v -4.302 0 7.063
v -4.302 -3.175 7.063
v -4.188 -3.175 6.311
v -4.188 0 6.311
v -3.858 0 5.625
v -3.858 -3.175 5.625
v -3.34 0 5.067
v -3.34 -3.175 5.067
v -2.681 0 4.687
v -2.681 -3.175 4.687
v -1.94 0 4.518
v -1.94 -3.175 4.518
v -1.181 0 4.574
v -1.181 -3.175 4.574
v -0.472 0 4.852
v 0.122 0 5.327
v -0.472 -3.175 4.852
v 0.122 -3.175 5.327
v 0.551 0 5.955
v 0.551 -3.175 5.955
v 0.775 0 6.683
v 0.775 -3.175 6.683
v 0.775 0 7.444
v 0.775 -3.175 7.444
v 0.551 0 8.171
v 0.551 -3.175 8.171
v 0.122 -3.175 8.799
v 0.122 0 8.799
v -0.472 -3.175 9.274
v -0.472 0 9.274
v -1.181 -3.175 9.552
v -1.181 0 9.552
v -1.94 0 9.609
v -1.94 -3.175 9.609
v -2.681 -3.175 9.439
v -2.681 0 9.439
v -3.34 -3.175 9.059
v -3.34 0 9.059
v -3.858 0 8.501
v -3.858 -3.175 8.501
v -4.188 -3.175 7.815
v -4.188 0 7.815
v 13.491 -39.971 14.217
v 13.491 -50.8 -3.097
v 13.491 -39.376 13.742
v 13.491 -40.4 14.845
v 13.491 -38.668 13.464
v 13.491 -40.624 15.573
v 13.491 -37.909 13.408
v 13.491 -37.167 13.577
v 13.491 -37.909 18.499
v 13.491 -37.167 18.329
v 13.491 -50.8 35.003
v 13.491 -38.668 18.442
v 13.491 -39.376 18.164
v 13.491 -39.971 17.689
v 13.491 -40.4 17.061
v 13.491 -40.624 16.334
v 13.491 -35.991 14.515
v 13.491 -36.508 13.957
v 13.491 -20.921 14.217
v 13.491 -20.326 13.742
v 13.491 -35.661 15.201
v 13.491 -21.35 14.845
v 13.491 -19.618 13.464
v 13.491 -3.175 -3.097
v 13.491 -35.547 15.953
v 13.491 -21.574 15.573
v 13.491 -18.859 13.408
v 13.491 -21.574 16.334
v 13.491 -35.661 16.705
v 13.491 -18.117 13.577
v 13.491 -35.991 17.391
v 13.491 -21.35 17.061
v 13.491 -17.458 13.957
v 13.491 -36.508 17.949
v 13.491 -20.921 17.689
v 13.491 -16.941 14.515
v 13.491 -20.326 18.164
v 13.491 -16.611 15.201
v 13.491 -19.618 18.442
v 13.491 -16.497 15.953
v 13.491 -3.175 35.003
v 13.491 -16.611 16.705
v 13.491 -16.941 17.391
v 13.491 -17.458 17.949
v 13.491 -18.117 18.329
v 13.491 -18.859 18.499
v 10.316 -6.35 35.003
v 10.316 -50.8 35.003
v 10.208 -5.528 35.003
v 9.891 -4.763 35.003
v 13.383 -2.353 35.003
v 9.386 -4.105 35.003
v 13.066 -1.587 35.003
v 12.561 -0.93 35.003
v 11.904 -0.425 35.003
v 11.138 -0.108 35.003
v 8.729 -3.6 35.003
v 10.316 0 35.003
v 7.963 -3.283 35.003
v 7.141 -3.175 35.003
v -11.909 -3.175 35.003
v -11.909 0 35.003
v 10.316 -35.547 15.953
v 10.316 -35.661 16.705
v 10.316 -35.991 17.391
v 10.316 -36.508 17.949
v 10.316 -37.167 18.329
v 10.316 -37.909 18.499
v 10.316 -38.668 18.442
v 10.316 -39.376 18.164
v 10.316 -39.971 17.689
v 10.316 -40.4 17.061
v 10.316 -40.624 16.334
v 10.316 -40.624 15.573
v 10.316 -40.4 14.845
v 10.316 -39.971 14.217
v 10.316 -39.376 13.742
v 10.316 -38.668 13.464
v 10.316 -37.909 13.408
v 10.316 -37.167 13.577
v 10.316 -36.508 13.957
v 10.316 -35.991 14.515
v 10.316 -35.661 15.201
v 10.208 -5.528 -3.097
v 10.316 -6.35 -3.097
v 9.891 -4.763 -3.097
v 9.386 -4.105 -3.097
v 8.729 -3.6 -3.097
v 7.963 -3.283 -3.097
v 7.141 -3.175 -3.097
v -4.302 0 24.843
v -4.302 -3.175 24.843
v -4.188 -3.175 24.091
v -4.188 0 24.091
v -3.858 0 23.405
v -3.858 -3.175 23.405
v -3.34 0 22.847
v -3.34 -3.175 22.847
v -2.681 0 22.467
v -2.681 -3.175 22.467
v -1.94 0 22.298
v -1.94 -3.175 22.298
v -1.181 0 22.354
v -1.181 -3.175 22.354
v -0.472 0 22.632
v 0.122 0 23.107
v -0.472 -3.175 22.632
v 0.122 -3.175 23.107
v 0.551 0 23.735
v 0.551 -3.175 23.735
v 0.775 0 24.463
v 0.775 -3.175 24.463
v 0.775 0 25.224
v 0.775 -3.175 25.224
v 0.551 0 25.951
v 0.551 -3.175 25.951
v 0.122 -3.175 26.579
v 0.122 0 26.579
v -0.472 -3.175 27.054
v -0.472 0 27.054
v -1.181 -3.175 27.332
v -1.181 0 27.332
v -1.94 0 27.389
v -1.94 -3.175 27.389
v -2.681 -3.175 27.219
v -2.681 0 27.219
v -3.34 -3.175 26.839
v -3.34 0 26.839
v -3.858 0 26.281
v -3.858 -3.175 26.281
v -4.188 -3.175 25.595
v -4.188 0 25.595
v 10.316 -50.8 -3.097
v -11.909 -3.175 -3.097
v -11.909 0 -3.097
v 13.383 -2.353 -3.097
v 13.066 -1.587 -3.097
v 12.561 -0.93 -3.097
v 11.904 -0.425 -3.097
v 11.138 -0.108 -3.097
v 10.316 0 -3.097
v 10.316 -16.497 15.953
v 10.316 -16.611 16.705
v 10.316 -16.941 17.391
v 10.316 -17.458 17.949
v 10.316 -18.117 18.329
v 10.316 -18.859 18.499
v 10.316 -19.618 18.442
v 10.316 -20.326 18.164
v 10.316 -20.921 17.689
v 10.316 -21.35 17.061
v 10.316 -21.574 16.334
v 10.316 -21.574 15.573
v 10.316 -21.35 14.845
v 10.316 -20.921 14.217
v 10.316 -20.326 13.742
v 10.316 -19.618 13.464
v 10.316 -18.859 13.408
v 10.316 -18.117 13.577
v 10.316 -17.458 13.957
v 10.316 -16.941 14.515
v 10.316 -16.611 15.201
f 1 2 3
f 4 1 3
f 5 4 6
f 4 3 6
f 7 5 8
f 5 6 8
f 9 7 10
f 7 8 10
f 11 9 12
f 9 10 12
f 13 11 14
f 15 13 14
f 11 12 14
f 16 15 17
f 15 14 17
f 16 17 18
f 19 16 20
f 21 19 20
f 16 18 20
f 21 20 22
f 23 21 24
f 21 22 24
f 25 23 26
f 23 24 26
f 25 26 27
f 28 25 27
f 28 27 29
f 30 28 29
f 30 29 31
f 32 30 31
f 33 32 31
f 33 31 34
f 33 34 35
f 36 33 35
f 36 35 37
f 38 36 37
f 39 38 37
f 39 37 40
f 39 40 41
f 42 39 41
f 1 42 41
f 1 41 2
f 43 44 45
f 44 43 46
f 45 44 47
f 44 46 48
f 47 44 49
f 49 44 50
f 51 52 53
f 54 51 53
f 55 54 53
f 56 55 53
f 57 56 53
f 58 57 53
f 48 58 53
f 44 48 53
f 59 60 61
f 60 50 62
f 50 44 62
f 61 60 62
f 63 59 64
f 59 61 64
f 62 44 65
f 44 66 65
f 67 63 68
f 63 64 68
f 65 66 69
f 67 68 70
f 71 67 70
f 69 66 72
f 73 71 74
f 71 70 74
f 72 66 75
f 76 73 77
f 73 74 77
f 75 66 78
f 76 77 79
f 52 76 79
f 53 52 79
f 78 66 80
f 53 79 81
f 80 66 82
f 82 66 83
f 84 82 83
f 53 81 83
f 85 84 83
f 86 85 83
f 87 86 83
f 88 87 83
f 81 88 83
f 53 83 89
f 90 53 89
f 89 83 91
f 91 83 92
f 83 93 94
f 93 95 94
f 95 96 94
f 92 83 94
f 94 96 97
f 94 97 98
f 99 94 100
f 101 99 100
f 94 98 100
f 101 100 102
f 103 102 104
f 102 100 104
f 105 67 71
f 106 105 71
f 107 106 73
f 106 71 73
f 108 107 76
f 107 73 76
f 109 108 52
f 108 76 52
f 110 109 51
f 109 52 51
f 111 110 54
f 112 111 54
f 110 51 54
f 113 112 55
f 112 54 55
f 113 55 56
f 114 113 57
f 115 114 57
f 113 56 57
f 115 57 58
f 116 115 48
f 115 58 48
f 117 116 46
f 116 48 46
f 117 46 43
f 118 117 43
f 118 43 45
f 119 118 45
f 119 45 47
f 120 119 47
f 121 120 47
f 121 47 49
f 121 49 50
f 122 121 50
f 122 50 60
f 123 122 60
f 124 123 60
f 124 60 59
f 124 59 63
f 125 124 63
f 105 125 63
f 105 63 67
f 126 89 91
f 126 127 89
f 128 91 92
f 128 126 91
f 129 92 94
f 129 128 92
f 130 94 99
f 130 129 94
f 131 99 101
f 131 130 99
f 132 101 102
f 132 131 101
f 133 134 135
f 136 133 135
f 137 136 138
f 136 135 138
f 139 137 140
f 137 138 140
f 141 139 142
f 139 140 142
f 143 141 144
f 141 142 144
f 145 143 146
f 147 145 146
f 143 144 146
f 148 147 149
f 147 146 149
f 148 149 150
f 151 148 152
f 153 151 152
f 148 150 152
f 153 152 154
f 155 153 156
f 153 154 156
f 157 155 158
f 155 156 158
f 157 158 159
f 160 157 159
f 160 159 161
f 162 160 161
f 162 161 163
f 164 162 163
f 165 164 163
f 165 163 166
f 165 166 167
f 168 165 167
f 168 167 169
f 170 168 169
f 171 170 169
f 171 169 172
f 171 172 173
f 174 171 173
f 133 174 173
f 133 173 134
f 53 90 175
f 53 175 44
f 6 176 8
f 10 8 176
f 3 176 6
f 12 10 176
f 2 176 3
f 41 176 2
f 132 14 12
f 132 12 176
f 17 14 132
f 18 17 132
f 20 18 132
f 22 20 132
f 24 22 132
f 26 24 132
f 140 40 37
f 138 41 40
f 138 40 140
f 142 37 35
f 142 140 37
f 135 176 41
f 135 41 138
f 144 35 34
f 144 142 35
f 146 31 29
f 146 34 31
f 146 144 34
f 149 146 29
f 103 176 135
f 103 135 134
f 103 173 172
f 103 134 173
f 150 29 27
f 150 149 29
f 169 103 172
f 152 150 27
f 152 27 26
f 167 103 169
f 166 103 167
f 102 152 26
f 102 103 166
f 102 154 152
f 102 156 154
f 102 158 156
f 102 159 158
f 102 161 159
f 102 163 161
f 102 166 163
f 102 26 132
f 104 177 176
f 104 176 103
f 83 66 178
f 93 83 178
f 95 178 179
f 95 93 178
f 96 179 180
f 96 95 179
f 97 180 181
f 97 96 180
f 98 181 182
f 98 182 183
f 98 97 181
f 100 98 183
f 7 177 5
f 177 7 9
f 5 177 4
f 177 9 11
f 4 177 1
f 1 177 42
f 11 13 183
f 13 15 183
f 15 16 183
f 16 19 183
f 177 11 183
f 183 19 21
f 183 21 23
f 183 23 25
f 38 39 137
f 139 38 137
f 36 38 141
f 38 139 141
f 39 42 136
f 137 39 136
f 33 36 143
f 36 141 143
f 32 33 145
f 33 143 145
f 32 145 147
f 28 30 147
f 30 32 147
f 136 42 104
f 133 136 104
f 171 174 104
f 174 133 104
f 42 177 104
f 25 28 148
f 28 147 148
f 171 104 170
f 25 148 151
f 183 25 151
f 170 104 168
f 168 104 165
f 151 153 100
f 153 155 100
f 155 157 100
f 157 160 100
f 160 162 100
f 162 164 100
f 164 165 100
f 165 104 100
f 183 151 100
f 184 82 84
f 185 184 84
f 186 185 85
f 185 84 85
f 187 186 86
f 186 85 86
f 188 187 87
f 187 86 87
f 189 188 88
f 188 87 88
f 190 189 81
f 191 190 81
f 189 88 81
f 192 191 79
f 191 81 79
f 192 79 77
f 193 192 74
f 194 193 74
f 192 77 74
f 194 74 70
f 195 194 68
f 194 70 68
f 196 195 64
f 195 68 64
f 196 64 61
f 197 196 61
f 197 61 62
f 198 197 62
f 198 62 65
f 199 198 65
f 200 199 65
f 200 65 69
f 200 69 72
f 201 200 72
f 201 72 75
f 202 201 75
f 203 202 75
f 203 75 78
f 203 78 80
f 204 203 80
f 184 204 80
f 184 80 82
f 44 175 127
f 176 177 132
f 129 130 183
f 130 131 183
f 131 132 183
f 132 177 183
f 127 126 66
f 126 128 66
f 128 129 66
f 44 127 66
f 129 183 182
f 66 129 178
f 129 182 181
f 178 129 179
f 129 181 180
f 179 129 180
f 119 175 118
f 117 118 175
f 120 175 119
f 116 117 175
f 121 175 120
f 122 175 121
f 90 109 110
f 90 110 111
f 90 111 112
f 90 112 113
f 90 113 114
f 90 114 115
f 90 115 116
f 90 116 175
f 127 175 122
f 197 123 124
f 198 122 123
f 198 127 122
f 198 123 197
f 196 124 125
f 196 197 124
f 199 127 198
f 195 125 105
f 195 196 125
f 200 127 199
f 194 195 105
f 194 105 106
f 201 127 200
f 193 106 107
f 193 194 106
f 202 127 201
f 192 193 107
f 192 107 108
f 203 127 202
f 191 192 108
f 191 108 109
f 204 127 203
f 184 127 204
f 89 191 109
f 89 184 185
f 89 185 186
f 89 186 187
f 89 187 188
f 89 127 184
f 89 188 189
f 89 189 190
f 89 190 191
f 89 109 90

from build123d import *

# Parameters (mm, degrees)
F0_W     = 22.225
F0_H     = 38.1
F0_W_2   = 3.175
F1_DEPTH = 3.175
F2_D     = 5.1054
F3_DEPTH = 50.8
F4_R     = 3.175
F6_D     = 5.1054


with BuildPart() as f1:
    # F0 (on Front) → F1 (new body)
    with BuildSketch(Plane.XZ):
        with Locations((-0.7963004947, 15.9530722331)):
            Rectangle(F0_W, F0_H)
        with Locations((11.9036995053, 15.9530722331)):
            Rectangle(F0_W_2, F0_H)
    extrude(amount=F1_DEPTH)

    # F2 (through all)
    with Locations(Plane(origin=(0, 0, 0), x_dir=(1, 0, 0), z_dir=(0, 1, 0))):
        with Locations((-1.7488004947, -24.8430722331), (-1.7488004947, -7.0630722331)):
            Hole(F2_D / 2)

    # F0 (on Front) → F3 (join)
    with BuildSketch(Plane.XZ):
        with Locations((11.9036995053, 15.9530722331)):
            Rectangle(F0_W_2, F0_H)
    extrude(amount=F3_DEPTH)

    # F4
    f4_edges = [f1.edges().sort_by_distance(p)[0] for p in [
        (10.3162, -3.175, 15.953072),
        (13.4912, 0, 15.953072),
    ]]
    fillet(f4_edges, radius=F4_R)

    # F6 (through all)
    with Locations(Plane(origin=(10.3161995053, 0, 0), x_dir=(0, -1, 0), z_dir=(-1, 0, 0))):
        with Locations((19.05, 15.9530722331), (38.1, 15.9530722331)):
            Hole(F6_D / 2)


solid = f1.part
